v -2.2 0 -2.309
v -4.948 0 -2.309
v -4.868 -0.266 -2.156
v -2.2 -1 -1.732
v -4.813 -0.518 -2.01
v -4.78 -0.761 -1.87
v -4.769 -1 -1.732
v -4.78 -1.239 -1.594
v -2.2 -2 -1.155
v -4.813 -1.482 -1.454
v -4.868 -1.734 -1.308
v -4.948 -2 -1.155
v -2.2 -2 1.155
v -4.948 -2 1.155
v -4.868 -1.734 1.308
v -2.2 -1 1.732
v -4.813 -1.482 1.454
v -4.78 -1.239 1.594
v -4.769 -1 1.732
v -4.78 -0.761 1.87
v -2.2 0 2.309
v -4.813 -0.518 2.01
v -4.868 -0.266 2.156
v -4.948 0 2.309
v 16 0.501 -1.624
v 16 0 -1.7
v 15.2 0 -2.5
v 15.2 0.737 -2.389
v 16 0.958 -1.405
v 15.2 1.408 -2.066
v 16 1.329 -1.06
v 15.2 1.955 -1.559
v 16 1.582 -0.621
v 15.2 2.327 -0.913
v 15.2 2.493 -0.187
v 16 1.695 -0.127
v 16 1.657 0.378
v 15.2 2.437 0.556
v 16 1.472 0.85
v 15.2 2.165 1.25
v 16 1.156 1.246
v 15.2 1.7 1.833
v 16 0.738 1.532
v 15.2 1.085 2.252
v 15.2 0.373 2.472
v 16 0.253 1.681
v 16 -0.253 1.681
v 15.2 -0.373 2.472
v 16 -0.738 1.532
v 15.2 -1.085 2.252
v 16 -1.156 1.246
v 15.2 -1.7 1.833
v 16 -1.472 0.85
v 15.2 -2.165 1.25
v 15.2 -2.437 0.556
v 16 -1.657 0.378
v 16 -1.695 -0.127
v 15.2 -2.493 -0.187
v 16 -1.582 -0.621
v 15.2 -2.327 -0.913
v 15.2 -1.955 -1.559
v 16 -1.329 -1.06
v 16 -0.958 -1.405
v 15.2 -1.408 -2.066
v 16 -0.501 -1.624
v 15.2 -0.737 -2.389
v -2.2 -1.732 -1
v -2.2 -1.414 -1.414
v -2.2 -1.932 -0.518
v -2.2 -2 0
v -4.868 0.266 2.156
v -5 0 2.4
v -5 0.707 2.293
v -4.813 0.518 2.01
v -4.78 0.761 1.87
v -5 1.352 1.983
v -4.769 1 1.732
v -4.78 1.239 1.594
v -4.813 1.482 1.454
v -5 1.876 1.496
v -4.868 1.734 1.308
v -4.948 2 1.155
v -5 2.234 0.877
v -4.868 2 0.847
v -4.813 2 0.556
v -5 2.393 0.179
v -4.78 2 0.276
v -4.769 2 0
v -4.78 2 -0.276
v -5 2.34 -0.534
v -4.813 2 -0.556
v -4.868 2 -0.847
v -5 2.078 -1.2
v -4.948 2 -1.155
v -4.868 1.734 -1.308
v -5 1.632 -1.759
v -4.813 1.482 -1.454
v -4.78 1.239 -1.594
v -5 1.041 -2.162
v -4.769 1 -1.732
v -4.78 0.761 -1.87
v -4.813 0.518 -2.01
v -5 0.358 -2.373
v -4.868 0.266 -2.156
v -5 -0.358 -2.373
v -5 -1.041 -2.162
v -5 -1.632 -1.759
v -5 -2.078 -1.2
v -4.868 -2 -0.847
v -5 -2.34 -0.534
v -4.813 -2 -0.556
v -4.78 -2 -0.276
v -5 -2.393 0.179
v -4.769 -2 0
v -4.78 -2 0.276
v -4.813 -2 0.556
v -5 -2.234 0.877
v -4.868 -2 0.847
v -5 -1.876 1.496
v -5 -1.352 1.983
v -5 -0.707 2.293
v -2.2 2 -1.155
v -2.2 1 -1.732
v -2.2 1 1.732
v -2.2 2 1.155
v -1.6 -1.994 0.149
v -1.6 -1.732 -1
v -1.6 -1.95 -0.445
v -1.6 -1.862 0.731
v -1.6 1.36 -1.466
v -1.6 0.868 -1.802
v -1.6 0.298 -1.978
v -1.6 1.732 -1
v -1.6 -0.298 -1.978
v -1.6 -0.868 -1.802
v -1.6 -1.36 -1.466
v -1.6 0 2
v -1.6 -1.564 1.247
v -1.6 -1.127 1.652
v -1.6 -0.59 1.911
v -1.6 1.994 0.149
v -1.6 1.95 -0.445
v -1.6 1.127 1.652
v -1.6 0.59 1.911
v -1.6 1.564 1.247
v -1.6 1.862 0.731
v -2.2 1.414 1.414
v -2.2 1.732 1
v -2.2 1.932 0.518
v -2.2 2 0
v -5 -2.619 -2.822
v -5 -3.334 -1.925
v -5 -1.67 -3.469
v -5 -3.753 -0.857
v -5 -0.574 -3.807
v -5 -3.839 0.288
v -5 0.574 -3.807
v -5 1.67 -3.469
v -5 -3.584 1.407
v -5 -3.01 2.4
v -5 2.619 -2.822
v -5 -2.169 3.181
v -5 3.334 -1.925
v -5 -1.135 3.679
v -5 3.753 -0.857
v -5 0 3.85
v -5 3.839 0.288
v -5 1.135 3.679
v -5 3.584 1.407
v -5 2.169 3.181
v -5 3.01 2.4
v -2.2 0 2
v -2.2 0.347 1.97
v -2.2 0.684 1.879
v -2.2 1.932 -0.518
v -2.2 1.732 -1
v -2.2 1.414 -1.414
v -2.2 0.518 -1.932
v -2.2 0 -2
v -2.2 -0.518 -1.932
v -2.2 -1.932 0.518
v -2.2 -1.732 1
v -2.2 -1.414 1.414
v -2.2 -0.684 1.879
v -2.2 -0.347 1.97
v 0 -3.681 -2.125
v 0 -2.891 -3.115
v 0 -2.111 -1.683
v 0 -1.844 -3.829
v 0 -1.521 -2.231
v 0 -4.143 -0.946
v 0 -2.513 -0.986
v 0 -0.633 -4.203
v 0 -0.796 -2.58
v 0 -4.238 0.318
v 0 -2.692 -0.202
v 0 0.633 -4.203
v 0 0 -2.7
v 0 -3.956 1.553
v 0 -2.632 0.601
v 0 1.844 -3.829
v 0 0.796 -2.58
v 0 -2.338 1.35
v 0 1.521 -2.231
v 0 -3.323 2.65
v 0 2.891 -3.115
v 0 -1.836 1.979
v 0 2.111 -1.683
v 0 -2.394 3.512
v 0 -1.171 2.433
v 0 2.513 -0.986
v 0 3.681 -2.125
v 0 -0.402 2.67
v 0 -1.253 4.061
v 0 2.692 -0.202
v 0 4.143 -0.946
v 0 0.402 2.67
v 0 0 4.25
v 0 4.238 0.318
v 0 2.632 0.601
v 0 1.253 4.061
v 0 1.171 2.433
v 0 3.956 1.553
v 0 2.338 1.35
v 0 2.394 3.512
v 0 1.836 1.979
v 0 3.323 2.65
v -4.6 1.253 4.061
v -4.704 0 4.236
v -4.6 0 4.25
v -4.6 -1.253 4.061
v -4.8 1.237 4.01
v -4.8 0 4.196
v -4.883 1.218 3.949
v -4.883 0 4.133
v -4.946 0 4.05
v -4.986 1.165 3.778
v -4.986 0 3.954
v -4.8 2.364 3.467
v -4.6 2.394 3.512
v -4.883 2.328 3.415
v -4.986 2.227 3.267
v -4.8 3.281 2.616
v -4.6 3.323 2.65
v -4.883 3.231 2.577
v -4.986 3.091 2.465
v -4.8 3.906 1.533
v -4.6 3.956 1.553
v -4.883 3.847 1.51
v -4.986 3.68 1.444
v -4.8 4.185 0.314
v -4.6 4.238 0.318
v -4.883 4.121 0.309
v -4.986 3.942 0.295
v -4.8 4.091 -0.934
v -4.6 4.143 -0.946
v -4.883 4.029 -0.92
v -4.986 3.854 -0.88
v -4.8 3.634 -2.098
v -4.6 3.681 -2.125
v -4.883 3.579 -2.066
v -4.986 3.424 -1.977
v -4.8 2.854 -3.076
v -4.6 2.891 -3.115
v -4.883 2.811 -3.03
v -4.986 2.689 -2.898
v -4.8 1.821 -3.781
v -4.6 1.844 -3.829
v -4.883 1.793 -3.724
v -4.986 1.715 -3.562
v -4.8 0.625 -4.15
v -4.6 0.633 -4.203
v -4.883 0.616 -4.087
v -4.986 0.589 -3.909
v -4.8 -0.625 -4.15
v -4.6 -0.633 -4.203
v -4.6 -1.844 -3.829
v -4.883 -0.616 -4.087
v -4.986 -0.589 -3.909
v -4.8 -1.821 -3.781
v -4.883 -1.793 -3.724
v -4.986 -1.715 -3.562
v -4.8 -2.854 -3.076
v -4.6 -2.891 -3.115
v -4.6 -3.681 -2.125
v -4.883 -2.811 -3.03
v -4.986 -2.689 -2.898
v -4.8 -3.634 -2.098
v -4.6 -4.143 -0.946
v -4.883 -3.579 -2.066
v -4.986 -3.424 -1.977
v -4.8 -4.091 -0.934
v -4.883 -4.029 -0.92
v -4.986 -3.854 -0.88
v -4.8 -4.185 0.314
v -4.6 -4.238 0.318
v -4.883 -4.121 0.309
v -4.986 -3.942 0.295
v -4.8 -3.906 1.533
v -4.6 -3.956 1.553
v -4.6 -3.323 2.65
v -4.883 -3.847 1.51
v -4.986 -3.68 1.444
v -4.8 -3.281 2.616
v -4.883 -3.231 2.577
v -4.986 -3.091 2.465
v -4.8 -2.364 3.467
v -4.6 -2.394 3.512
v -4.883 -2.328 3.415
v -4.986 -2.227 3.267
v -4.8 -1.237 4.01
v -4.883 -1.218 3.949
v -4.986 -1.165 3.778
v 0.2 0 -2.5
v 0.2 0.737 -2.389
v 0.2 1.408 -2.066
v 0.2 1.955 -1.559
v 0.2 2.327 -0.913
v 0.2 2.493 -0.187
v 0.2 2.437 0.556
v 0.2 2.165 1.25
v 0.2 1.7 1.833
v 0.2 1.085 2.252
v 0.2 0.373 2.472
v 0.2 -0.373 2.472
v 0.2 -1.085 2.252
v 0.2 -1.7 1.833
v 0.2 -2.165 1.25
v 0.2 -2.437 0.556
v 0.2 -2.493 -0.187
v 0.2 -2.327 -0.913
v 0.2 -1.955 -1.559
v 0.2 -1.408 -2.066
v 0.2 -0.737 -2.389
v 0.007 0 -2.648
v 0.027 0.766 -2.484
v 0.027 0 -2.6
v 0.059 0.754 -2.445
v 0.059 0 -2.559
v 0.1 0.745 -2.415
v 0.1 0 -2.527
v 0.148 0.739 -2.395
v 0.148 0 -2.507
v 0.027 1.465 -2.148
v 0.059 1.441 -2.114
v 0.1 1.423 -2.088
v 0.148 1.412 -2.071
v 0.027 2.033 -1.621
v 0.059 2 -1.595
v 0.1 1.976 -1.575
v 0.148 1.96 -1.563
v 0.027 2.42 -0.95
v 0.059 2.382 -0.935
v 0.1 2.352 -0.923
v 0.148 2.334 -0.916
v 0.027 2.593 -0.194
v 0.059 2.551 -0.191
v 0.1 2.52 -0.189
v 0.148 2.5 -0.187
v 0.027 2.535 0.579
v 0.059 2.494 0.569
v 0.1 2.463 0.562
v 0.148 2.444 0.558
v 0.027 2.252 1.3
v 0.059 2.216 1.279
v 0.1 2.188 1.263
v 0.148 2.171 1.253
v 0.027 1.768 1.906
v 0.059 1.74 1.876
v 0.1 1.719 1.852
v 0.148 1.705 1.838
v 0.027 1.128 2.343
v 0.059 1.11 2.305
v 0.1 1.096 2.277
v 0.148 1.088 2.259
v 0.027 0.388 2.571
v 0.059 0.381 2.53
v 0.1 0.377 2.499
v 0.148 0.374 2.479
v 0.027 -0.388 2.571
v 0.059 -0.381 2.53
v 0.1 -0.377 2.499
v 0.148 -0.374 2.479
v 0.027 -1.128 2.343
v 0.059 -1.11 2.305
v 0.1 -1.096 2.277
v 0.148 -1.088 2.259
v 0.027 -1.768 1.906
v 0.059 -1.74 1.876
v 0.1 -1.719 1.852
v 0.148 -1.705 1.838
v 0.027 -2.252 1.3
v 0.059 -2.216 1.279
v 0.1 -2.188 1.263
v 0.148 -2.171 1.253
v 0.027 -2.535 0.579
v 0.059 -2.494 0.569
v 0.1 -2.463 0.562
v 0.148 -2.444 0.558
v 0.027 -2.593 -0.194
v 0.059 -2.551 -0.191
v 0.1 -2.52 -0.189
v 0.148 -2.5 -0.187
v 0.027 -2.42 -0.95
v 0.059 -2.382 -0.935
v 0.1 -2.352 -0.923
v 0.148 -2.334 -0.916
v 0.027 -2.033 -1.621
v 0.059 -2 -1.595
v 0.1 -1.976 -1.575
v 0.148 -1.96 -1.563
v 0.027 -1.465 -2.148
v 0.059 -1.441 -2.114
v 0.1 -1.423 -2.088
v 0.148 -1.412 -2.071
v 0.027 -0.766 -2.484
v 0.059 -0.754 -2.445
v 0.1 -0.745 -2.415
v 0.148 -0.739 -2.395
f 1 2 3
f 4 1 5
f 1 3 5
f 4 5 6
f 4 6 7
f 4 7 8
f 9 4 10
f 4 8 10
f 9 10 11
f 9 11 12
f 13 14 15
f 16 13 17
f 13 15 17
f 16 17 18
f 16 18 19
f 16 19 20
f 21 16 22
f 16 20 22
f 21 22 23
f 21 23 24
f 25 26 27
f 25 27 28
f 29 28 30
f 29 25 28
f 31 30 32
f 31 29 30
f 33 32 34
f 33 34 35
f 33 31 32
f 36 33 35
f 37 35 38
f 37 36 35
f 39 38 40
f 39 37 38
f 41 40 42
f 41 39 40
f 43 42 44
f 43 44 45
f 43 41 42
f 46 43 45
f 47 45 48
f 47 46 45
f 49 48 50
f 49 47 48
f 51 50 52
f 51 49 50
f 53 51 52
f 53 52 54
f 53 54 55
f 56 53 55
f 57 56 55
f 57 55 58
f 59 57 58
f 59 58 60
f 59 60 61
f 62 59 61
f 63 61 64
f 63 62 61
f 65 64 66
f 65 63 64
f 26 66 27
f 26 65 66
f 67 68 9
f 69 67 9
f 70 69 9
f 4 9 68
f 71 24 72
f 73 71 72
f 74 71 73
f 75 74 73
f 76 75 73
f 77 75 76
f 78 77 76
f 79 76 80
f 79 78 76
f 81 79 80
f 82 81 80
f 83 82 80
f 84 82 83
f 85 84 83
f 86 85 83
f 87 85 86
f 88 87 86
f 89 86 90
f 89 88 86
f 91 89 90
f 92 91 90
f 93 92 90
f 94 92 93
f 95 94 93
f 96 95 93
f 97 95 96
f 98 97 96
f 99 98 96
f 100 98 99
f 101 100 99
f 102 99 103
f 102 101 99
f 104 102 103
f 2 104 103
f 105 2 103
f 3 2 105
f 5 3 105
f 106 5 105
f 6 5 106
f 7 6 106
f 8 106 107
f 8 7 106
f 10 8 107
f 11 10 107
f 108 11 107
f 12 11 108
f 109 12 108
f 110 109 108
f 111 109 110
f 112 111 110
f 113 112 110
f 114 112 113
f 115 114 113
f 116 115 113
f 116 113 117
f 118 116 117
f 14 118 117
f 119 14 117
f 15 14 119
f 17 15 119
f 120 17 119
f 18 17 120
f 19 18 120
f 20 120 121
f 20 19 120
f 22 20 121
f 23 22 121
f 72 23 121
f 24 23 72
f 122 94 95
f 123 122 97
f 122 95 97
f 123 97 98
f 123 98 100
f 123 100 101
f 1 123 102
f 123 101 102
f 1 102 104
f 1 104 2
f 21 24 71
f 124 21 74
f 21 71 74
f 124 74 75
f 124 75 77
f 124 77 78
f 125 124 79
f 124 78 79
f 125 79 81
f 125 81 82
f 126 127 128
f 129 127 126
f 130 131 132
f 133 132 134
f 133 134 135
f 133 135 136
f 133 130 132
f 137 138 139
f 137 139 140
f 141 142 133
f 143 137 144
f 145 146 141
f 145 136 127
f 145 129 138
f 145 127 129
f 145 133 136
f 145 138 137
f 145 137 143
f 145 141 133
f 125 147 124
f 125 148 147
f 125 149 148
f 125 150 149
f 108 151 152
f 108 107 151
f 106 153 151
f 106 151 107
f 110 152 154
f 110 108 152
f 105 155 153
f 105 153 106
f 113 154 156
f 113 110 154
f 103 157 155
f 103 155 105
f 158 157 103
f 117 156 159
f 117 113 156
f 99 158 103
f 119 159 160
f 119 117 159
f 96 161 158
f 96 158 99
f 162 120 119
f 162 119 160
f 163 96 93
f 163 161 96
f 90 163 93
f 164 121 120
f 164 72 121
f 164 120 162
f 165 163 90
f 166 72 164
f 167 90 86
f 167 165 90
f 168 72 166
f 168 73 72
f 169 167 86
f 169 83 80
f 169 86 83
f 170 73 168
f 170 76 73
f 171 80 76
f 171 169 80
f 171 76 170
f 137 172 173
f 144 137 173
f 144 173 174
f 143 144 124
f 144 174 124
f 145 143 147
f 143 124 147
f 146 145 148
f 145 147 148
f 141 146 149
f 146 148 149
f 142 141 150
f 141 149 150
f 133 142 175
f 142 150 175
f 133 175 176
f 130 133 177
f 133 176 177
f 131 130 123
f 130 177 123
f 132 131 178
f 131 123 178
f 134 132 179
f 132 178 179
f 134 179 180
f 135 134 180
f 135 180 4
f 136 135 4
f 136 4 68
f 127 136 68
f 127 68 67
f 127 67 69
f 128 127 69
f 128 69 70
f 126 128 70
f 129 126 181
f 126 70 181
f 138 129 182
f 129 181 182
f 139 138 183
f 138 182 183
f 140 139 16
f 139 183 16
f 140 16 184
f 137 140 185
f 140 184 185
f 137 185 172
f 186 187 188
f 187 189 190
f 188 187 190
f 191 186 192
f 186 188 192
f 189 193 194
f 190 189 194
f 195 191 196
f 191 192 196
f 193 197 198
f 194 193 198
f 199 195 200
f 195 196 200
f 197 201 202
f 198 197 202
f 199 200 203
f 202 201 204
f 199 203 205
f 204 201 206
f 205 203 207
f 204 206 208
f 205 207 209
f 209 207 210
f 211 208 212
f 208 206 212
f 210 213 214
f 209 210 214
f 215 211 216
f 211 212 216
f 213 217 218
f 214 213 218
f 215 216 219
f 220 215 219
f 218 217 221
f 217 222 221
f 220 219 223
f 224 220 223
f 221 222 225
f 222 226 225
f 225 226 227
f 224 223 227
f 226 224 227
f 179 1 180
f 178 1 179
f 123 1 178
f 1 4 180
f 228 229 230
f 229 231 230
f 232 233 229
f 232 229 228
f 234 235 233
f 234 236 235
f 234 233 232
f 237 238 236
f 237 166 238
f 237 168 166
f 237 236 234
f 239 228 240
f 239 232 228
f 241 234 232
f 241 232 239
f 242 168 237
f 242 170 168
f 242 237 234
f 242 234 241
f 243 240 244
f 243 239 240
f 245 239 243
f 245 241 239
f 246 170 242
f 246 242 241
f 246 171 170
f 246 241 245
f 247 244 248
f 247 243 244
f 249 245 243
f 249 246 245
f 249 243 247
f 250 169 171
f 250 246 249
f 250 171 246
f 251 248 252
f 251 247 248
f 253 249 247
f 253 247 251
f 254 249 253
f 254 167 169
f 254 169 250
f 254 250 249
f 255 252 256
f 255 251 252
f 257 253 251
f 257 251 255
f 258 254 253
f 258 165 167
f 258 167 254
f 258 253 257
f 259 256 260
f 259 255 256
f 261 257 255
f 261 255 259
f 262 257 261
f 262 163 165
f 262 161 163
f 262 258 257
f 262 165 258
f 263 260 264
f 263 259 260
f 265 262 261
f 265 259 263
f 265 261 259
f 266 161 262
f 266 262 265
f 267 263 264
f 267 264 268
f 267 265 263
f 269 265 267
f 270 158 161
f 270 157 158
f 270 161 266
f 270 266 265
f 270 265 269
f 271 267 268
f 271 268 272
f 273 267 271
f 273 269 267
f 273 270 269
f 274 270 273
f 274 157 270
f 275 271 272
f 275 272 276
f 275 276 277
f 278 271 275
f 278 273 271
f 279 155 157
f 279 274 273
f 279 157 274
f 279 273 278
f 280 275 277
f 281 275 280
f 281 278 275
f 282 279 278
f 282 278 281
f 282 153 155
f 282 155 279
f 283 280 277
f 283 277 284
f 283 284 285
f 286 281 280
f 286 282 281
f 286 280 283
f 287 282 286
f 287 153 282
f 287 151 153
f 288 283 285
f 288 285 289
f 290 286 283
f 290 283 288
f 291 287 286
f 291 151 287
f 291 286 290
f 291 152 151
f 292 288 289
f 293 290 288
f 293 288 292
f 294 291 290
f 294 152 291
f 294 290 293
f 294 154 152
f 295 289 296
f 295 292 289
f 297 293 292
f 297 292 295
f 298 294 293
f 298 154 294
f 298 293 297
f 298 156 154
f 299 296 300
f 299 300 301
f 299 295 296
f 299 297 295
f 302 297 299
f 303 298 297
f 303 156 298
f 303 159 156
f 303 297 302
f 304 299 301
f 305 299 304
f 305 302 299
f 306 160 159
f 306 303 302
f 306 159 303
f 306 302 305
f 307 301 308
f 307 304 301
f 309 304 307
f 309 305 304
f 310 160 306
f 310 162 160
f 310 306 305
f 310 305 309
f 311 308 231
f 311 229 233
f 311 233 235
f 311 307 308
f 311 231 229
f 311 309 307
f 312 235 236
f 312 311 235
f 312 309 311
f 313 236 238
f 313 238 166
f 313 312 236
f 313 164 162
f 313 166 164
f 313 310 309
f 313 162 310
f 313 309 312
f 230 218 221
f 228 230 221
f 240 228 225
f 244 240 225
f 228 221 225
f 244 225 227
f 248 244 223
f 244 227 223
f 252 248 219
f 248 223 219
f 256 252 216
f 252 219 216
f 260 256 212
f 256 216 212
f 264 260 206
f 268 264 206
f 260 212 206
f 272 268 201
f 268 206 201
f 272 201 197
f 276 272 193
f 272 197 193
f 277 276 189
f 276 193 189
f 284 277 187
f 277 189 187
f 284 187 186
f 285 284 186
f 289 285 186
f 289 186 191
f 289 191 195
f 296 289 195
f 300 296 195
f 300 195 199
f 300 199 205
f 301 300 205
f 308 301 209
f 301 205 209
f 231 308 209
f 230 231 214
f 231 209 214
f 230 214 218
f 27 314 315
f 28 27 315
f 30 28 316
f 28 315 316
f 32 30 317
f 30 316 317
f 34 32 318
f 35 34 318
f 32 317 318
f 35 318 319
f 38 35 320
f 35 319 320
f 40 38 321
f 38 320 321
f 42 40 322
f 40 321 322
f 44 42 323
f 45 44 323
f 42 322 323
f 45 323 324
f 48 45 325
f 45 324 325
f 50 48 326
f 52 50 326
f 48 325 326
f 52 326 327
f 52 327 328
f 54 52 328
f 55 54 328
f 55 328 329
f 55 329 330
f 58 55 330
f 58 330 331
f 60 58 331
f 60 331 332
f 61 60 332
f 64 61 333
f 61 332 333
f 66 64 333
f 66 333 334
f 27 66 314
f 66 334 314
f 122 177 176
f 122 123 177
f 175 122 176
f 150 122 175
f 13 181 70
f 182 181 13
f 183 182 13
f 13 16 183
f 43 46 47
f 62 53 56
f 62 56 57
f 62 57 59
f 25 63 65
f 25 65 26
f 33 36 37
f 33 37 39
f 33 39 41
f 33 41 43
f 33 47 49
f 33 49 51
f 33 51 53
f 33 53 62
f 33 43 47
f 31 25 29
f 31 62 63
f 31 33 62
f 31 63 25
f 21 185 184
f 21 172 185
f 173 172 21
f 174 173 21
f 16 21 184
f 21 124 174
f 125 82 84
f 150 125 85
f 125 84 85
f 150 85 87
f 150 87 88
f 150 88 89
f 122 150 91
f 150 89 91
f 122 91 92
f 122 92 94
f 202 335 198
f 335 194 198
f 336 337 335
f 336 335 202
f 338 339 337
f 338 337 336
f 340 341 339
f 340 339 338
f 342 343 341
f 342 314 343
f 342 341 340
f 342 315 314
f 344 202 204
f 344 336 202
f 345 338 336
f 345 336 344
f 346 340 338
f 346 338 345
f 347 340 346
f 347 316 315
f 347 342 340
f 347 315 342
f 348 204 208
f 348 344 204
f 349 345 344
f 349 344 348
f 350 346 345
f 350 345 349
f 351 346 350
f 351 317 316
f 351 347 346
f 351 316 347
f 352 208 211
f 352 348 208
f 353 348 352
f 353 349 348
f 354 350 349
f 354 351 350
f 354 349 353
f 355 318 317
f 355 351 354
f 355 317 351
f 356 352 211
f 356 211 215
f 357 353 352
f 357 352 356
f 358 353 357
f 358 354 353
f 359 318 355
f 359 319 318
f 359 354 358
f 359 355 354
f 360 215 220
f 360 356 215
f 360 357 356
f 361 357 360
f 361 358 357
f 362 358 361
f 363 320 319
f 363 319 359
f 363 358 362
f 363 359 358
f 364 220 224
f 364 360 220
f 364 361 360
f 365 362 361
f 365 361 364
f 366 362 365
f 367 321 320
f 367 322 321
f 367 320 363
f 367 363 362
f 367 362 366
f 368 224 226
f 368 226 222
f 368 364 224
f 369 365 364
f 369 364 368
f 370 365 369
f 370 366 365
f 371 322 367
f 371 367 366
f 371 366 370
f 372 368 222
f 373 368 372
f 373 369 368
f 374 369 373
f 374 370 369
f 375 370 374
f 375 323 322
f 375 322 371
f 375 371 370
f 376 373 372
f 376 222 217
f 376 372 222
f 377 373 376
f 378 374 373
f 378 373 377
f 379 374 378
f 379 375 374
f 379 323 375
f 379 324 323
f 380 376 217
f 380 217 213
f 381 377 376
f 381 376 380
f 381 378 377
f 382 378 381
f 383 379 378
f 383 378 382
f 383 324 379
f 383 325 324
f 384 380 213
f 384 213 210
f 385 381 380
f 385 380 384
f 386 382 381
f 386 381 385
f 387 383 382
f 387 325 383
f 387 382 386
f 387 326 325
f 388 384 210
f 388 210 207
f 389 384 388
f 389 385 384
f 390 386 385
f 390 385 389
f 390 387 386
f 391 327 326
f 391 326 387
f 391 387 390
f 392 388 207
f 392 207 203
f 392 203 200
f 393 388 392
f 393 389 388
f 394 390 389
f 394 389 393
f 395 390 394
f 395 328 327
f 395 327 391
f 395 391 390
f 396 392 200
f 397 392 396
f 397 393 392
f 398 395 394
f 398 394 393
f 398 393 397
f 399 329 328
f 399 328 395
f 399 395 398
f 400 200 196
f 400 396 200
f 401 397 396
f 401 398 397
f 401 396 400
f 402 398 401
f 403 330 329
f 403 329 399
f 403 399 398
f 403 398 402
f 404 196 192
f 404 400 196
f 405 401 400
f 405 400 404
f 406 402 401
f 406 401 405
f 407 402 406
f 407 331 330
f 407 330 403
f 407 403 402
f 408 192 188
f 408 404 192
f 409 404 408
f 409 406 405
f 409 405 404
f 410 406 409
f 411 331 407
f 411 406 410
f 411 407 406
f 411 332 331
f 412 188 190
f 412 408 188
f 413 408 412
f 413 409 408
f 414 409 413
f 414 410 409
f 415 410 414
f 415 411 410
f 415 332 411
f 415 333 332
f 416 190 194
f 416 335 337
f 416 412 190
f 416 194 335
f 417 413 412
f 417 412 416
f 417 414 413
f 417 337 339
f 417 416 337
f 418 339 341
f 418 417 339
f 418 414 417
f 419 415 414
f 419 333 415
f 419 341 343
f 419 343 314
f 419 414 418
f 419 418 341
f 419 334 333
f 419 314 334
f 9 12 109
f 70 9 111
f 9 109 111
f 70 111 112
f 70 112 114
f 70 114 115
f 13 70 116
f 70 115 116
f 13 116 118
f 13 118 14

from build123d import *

# Parameters (mm, degrees)
SKETCH_1_R          = 2.5
EXTRUDE_1_DEPTH     = 16
SKETCH_2_R          = 4.25
EXTRUDE_2_DEPTH     = 5
SKETCH_3_R          = 2
CUT_EXTRUDE_1_DEPTH = 3.4
CHAMFER_1_SIZE      = 0.8
FILLET_1_R          = 0.4
FILLET_2_R          = 0.2
CHAMFER_2_SIZE      = 0.4
CHAMFER_2_SIZE2     = 0.230940108
CUT_EXTRUDE_2_DEPTH = 2.8


with BuildPart() as part:
    # Эскиз1 → Вытянуть1 (new body)
    with BuildSketch(Plane(origin=(0, 0, 0), x_dir=(0, 0, -1), z_dir=(1, 0, 0))):
        Circle(SKETCH_1_R)
    extrude(amount=EXTRUDE_1_DEPTH)

    # Эскиз2 → Вытянуть2 (add)
    with BuildSketch(Plane.ZY):
        Circle(SKETCH_2_R)
    extrude(amount=EXTRUDE_2_DEPTH)

    # Эскиз3 → Вырез-Вытянуть1 (cut)
    with BuildSketch(Plane.ZY.offset(5)):
        Circle(SKETCH_3_R)
    extrude(amount=-CUT_EXTRUDE_1_DEPTH, mode=Mode.SUBTRACT)

    # Фаска1
    chamfer_1_edges = [part.edges().sort_by_distance(p)[0] for p in [
        (16, 0, 2.5),
    ]]
    chamfer(chamfer_1_edges, length=CHAMFER_1_SIZE)

    # Скругление1
    fillet_1_edges = [part.edges().sort_by_distance(p)[0] for p in [
        (-5, 0, -4.25),
    ]]
    fillet(fillet_1_edges, radius=FILLET_1_R)

    # Скругление2
    fillet_2_edges = [part.edges().sort_by_distance(p)[0] for p in [
        (0, 0, 2.5),
    ]]
    fillet(fillet_2_edges, radius=FILLET_2_R)

    # Фаска2
    chamfer_2_edges = [part.edges().sort_by_distance(p)[0] for p in [
        (-5, 0, -2),
    ]]
    chamfer_2_side = [part.faces().sort_by_distance(p)[0] for p in [
        (-5, 0, -3.741105556),
    ]]
    chamfer(chamfer_2_edges, length=CHAMFER_2_SIZE, length2=CHAMFER_2_SIZE2, reference=chamfer_2_side[0])

    # Эскиз4 → Вырез-Вытянуть2 (cut)
    with BuildSketch(Plane.ZY.offset(5)):
        Polygon((2.309401077, 0), (1.154700538, 2), (-1.154700538, 2), (-2.309401077, 0), (-1.154700538, -2), (1.154700538, -2), align=None)
    extrude(amount=-CUT_EXTRUDE_2_DEPTH, mode=Mode.SUBTRACT)


solid = part.part
